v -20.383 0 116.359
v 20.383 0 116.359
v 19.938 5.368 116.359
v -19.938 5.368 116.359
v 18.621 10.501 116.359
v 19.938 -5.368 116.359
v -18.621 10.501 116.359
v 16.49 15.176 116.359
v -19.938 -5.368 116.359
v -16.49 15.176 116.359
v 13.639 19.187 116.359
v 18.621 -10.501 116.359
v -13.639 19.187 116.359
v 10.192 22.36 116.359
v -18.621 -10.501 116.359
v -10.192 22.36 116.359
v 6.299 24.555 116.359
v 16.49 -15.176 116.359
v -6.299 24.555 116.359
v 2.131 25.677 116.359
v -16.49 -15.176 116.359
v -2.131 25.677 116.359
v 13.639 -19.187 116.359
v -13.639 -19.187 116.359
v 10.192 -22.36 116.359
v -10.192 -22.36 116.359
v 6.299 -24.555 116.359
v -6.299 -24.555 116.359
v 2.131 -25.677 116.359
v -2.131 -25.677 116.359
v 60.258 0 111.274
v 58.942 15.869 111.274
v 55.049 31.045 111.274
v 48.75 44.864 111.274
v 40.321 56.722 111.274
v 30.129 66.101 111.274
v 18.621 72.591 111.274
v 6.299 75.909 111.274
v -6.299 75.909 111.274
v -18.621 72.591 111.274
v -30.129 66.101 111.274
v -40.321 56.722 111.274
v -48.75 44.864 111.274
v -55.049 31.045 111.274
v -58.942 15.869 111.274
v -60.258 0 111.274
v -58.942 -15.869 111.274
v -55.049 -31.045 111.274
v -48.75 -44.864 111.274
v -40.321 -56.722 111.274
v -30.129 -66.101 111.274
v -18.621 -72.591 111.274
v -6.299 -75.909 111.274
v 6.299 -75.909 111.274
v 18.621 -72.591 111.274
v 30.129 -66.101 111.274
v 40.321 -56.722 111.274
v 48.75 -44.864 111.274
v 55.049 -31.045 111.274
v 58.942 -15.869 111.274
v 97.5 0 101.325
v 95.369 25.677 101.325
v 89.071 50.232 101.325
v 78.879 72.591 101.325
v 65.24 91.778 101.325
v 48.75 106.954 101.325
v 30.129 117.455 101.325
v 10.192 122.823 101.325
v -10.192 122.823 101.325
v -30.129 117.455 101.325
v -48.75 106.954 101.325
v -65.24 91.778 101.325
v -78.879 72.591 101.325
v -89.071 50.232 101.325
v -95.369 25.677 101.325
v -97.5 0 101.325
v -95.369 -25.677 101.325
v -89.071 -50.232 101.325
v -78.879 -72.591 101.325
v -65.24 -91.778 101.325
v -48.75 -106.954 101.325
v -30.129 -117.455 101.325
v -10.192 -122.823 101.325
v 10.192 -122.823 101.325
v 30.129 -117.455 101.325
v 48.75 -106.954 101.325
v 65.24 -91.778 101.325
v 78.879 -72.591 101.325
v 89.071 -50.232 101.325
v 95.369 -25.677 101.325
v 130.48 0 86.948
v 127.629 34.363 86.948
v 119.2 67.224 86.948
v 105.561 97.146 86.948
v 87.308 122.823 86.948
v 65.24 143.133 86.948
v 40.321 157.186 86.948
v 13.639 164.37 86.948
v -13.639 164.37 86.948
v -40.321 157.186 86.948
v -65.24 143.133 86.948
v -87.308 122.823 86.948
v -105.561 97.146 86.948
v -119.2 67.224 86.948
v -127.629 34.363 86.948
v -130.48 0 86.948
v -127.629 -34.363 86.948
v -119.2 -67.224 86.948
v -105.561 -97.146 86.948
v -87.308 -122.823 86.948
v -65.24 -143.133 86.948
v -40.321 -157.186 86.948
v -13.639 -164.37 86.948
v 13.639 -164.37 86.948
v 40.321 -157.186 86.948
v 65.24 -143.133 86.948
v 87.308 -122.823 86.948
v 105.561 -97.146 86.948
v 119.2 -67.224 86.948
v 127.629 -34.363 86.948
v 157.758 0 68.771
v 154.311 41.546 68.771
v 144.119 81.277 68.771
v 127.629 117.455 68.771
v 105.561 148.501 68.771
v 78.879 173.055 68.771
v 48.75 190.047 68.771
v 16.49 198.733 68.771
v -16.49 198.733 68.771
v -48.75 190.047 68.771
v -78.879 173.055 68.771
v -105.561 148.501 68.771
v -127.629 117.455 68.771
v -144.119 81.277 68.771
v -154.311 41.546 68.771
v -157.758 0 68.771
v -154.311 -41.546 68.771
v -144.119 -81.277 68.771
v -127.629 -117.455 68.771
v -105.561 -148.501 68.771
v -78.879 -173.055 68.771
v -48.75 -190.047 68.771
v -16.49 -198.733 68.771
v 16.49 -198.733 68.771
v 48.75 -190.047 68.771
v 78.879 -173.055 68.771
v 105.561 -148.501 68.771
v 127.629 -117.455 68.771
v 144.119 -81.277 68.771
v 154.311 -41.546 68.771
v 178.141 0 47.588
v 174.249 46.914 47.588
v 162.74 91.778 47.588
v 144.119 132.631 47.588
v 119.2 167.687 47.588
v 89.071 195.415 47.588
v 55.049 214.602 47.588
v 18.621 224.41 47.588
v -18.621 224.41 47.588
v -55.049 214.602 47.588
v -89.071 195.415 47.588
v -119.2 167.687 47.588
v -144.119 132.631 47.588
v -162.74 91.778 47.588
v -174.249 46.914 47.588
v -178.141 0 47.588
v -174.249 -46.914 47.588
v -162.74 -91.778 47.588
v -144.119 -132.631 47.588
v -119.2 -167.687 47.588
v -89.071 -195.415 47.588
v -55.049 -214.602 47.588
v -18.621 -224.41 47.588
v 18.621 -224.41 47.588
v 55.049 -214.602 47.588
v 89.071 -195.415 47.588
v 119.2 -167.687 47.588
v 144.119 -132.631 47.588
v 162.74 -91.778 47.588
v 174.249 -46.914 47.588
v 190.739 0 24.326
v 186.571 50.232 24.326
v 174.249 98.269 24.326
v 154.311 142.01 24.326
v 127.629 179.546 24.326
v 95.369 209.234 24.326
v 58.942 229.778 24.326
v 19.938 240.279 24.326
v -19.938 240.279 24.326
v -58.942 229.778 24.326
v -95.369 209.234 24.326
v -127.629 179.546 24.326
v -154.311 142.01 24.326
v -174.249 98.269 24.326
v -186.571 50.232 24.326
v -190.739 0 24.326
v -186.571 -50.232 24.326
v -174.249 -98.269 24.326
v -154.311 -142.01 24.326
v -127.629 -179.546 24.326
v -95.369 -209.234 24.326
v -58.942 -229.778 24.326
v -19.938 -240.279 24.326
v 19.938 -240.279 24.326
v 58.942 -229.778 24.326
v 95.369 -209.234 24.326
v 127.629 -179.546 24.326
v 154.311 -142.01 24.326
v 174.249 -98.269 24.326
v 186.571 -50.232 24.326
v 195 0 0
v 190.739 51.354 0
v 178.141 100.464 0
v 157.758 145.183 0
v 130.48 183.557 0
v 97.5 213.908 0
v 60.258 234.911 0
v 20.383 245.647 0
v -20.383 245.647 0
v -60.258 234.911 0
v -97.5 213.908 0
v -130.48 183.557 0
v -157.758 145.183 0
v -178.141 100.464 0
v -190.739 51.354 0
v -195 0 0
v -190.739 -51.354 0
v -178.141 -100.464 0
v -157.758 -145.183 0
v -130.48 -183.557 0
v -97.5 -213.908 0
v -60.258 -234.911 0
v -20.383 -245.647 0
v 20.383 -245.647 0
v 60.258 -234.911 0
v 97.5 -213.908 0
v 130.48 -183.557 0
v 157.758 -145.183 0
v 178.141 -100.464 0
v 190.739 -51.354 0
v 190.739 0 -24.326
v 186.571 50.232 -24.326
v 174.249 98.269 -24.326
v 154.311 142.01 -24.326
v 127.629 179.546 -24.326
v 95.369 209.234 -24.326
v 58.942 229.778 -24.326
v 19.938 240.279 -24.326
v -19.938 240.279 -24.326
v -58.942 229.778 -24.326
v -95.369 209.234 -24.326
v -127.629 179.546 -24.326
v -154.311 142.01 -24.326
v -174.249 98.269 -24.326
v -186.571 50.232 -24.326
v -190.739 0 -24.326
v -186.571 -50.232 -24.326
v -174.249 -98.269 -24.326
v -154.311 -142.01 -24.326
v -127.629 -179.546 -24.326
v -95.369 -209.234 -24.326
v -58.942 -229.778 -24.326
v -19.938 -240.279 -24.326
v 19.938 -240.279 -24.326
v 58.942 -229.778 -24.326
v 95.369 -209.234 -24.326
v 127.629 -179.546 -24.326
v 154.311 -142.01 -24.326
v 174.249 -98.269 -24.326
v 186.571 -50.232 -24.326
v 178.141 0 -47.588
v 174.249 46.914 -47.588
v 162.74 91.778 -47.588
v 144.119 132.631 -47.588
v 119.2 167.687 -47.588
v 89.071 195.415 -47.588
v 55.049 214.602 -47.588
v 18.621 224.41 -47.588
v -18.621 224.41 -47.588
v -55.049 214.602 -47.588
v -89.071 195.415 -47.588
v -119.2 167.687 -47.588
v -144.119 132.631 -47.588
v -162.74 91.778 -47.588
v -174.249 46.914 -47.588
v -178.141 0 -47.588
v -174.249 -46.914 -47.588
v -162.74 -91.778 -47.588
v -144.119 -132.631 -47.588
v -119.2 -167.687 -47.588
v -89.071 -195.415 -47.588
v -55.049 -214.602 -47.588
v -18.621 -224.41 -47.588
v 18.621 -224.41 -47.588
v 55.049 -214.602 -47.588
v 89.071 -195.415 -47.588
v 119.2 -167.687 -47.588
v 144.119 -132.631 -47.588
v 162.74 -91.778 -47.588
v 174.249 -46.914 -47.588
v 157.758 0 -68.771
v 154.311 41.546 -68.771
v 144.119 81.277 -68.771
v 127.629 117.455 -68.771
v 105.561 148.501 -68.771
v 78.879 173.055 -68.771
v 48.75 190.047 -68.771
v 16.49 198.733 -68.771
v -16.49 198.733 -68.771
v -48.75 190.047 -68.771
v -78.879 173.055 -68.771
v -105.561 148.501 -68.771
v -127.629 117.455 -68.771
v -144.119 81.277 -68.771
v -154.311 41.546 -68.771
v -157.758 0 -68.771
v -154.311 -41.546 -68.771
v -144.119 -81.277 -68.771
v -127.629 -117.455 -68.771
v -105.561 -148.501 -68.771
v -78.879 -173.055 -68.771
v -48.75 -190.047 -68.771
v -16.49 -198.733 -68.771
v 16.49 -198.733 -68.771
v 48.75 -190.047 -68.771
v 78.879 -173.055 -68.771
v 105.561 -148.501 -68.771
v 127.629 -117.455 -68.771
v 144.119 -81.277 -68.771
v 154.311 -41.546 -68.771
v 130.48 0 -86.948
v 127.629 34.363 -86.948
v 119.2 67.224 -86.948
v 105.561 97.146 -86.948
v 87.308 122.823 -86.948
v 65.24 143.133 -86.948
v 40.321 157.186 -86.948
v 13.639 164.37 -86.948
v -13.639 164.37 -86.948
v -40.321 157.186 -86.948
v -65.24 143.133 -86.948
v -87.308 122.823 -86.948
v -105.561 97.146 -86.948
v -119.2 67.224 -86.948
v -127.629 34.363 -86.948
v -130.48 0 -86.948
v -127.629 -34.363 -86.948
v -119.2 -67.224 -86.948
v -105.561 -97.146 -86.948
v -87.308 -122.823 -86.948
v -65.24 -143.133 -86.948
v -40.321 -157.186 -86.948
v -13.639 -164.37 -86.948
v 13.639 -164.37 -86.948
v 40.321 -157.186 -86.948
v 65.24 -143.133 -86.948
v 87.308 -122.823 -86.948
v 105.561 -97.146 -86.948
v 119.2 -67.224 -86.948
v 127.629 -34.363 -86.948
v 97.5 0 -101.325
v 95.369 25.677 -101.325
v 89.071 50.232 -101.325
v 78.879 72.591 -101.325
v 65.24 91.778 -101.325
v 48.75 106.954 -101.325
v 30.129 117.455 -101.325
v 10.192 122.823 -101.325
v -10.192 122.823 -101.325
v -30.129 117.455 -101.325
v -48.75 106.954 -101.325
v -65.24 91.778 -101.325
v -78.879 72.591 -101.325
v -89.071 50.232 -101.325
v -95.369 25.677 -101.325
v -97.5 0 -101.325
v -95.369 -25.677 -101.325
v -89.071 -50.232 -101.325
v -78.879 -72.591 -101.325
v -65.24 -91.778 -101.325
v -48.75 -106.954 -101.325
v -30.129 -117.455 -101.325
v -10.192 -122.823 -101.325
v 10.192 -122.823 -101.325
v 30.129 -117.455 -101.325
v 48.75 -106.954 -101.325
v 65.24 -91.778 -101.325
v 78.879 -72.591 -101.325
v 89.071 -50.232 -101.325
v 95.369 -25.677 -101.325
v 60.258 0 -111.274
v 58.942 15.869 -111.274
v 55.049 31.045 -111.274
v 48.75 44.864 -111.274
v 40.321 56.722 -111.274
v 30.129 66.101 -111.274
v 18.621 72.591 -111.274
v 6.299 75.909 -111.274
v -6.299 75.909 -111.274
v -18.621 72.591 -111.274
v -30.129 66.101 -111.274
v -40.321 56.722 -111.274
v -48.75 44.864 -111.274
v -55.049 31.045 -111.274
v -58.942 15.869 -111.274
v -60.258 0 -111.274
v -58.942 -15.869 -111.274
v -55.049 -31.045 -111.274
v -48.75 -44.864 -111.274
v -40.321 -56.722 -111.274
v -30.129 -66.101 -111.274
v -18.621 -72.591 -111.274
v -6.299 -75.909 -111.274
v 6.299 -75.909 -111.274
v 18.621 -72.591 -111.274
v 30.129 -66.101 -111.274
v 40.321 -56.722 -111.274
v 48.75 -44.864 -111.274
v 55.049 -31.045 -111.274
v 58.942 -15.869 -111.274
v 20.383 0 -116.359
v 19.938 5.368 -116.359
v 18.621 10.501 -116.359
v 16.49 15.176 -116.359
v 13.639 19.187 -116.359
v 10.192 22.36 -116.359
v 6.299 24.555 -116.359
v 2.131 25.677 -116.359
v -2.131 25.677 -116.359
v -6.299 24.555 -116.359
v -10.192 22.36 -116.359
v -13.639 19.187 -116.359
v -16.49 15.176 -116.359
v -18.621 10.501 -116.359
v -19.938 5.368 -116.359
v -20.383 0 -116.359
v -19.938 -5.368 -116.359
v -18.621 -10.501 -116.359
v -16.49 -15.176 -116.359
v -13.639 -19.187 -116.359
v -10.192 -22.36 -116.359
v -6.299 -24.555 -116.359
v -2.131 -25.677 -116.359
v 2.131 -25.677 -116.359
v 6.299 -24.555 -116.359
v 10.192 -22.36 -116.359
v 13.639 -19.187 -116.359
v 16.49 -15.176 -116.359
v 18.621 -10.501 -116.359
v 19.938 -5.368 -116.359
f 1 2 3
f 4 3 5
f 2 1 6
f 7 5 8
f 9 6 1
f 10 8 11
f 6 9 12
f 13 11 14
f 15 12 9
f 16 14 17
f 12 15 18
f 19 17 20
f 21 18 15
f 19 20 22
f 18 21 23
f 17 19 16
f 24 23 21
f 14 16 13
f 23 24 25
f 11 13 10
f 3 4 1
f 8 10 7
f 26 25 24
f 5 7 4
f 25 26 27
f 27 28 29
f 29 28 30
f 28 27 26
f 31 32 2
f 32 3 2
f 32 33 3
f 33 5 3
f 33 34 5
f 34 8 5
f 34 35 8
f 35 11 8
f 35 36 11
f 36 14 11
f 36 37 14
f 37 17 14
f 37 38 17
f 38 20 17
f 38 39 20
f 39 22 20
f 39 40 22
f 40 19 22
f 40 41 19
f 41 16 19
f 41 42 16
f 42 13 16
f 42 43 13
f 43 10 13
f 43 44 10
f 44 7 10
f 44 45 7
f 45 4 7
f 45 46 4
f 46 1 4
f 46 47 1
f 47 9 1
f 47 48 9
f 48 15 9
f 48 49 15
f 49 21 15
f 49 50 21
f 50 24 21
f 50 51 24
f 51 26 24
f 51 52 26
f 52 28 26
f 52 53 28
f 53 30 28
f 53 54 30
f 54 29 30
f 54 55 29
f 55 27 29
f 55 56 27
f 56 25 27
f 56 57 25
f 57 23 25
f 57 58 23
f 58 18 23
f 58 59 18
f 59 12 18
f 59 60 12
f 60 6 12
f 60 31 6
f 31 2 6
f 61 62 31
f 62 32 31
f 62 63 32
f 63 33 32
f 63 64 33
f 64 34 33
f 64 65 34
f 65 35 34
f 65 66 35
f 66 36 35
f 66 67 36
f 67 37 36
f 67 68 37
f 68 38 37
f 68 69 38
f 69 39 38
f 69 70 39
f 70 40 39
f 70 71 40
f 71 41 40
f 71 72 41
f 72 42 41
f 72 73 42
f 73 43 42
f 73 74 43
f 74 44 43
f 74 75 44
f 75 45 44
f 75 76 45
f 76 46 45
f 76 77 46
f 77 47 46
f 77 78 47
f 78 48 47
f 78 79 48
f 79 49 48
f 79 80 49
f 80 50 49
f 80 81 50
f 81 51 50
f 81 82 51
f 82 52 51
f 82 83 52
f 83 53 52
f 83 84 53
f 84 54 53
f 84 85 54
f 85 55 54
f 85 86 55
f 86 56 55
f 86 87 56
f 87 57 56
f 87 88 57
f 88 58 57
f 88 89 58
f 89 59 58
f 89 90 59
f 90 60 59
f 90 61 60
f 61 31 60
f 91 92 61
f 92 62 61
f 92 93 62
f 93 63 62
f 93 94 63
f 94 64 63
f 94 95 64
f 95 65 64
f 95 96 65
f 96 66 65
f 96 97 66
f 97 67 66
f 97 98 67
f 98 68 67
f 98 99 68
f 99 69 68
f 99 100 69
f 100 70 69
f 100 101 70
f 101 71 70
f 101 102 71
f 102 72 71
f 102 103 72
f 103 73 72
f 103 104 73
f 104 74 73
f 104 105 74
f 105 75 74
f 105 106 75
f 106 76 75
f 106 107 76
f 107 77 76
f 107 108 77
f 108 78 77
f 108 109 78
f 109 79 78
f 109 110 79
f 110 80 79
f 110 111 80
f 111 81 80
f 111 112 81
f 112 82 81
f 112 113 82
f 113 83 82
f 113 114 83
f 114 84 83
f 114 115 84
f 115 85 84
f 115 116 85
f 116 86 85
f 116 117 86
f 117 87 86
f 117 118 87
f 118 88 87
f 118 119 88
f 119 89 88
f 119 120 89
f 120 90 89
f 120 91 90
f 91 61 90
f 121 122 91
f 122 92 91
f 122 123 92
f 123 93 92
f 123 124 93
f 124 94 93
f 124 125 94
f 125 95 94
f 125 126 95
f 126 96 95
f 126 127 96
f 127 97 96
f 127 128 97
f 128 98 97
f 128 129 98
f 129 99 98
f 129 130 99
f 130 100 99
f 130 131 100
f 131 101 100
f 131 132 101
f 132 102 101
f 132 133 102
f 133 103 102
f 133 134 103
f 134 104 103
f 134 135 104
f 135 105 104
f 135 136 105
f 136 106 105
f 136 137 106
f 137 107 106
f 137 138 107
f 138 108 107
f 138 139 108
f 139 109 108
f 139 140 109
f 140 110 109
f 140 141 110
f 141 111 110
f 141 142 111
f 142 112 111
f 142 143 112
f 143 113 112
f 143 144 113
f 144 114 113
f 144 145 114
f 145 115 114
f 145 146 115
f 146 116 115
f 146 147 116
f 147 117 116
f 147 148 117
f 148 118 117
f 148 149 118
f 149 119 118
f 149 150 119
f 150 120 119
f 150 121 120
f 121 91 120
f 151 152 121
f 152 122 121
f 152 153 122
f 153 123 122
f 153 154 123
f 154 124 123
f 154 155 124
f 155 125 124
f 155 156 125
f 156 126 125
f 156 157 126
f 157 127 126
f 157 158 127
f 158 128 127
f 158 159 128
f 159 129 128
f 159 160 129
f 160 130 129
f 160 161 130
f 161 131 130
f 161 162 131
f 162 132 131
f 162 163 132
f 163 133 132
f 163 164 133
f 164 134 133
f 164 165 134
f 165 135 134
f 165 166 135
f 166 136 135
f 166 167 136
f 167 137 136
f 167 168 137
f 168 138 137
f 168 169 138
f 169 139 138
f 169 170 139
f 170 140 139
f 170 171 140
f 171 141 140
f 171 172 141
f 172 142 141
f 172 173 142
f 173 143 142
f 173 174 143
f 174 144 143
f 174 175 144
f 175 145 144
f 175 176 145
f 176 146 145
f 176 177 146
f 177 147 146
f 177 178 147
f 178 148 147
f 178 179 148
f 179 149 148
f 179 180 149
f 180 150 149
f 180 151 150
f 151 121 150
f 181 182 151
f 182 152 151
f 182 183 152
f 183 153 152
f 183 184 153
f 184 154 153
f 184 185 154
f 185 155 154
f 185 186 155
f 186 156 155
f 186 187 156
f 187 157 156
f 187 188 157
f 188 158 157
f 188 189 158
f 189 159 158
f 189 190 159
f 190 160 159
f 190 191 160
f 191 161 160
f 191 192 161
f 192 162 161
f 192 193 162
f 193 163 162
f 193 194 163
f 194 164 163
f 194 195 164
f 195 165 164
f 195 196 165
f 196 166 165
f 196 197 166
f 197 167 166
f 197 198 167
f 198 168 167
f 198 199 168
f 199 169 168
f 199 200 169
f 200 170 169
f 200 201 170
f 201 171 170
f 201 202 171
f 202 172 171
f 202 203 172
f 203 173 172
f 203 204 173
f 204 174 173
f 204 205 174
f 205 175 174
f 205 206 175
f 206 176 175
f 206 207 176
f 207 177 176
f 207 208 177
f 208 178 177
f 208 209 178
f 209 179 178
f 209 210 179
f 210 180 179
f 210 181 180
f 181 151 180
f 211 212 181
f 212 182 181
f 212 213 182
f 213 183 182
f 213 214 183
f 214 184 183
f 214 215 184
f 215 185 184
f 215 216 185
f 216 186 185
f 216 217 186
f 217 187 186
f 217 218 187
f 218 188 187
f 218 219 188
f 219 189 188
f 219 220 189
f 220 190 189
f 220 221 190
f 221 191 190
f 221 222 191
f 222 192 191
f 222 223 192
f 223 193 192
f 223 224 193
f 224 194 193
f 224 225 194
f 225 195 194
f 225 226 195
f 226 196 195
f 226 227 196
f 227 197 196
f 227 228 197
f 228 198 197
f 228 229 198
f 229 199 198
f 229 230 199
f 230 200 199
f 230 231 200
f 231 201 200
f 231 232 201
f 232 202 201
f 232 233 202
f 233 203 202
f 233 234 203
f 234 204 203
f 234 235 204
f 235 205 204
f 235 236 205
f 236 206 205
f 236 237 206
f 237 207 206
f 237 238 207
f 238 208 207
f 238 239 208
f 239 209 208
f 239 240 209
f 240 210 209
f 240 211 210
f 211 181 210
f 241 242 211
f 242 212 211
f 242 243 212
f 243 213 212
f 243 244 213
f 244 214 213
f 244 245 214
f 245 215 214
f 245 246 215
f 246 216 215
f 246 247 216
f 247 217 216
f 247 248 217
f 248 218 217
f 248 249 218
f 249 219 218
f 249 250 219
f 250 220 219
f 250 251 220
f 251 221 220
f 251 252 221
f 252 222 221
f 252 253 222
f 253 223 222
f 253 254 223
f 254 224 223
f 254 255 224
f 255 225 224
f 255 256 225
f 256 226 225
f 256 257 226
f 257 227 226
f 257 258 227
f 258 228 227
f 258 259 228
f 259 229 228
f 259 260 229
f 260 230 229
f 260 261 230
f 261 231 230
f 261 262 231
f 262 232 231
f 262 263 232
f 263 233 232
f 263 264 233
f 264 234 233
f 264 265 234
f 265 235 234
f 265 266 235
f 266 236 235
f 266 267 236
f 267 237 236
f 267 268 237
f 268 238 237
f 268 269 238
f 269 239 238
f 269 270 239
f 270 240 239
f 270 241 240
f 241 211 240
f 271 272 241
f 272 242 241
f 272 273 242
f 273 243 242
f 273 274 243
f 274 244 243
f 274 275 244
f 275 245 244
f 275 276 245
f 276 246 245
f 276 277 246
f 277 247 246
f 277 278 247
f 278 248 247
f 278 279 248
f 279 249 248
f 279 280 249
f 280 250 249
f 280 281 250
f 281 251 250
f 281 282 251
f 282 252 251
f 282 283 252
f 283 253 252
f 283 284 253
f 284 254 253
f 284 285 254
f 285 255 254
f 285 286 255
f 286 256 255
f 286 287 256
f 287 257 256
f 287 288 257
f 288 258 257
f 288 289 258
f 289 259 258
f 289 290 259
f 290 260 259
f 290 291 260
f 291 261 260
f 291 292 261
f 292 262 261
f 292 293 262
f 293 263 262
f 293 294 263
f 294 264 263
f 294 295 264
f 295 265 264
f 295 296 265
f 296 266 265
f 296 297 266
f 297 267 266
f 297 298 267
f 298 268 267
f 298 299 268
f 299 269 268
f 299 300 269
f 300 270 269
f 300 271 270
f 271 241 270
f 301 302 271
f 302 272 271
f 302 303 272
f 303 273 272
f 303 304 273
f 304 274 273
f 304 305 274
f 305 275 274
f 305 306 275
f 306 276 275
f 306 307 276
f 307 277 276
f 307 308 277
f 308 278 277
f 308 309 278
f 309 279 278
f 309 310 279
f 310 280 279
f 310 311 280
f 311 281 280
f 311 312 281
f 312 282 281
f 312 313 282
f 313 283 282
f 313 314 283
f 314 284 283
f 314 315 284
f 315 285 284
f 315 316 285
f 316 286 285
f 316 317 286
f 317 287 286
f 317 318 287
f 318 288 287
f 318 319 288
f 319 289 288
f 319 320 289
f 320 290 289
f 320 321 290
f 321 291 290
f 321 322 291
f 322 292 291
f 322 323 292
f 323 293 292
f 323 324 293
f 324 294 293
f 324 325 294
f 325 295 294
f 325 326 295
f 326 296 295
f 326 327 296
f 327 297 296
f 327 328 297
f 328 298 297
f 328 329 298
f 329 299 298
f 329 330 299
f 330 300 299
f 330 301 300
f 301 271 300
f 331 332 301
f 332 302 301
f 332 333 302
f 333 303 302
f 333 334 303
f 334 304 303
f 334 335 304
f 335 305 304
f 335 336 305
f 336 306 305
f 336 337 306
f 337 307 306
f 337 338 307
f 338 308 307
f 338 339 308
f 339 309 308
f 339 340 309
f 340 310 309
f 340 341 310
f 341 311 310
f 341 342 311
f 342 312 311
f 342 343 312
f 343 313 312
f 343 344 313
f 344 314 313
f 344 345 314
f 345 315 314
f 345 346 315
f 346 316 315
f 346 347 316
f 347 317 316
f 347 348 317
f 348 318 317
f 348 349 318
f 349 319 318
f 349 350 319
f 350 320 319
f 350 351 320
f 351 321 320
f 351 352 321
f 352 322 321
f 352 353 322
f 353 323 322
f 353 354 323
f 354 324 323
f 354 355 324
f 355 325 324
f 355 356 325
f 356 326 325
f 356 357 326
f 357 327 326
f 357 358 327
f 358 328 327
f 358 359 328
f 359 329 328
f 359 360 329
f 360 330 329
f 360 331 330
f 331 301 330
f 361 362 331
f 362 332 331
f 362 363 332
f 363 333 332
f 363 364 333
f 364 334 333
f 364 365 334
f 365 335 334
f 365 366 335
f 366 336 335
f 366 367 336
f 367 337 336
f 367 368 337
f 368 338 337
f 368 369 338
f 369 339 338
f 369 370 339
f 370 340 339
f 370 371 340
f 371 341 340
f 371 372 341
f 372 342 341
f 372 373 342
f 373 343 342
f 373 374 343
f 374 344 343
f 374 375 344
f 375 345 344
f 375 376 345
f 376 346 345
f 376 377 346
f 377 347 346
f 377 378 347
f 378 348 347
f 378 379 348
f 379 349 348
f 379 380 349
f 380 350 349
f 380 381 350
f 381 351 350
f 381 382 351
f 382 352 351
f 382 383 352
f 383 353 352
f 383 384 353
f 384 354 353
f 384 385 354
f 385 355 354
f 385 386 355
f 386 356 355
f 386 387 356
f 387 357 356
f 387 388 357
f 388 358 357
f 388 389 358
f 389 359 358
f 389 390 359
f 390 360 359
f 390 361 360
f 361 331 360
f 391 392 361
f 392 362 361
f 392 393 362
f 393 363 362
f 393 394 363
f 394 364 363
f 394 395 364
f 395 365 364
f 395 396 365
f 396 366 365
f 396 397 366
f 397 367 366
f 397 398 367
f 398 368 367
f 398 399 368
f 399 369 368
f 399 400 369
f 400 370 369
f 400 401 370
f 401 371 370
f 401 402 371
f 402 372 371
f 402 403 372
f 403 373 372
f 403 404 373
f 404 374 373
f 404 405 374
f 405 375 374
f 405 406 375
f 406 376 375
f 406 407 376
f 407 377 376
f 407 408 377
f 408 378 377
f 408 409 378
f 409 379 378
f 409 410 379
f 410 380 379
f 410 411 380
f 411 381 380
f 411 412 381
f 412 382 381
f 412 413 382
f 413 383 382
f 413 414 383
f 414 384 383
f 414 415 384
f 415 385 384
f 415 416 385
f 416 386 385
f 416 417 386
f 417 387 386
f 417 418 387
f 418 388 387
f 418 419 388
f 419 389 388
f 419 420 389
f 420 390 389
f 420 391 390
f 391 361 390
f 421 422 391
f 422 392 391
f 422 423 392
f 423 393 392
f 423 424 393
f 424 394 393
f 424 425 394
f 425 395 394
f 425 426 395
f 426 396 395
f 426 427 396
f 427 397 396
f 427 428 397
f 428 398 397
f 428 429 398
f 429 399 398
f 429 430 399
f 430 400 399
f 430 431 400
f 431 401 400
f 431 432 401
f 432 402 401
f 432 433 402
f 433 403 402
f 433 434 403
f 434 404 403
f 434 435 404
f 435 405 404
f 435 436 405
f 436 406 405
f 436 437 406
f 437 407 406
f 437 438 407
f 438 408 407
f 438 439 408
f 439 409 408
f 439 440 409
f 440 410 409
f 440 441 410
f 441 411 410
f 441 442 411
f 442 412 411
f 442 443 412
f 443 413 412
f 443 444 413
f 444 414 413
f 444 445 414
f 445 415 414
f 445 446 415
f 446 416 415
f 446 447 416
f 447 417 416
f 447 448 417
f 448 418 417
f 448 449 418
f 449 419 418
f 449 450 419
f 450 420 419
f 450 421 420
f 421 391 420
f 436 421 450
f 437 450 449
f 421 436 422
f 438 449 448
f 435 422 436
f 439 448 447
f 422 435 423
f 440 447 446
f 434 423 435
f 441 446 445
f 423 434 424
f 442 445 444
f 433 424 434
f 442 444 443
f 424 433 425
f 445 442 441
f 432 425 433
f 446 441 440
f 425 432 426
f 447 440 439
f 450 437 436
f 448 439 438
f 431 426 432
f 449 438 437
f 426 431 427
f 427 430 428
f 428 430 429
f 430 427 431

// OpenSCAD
// Generated by SolidPython 1.0.1 on 2020-07-29 00:46:52


scale(v = [15, 19, 9]) {
	sphere(r = 13);
}
/***********************************************
*********      SolidPython code:      **********
************************************************
 
# import packages: SolidPython
from solid import *
from solid.utils import *
from itertools import chain, combinations, permutations


class Resize:

    def __init__(self, scad_file):
        self.scad_file = scad_file
        #self.scad_file = import_scad(scad_file)
        # cone/cylinder param:
        self.r1 = 0
        self.r2 = 0
        self.h = 0
        # rectangular prism param:
        self.w = 0
        self.l = 0
        # ellipse param:
        self.r = 0

    # import OpenScad code (file name corresponds to shape)


    # classify shape + parameters
    def assign(self, param1, param2, param3):
        if self.scad_file == 'cone.scad':
            self.r1 = param1
            self.r2 = param2
            self.h = param3
        elif self.scad_file == 'cylinder.scad':
            self.r1 = param1
            self.r2 = param2
            self.h = param3
        elif self.scad_file == 'rectangularPrism.scad':
            self.h = param1
            self.l = param2
            self.w = param3
        else:
            self.r = param1
            self.h = param2

    # resize parameters
    def iterate(self):
        x = range(3, 20, 2)
        i = 1
        if self.scad_file == 'cone.scad':
            tempList = list(permutations(x, 2))
            for temp in tempList:
                param1 = temp[0]
                param2 = temp[1]
                filepath = 'produced_scad_files/' + 'cone' + str(param1) + '_' + str(param2) + '_' + '.scad'
                scad_render_to_file(cylinder(h=param1, r1=param2, r2=0), filepath)

        elif self.scad_file == 'cylinder.scad':
            tempList = list(permutations(x, 3))
            for temp in tempList:
                param1 = temp[0]
                param2 = temp[1]
                filepath = 'produced_scad_files/' + 'cylinder' + str(param1) + '_' + str(param2) + '_' + '.scad'
                scad_render_to_file(cylinder(h=param1, r1=param2, r2=param2), filepath)

        elif self.scad_file == 'rectangularPrism.scad':
            tempList = list(permutations(x, 3))
            for temp in tempList:
                param1 = temp[0]
                param2 = temp[1]
                param3 = temp[2]
                filepath = 'produced_scad_files/' + 'rectangularPrism' + str(param1) + '_' + str(param2) + '_' + str(
                    param3) + '.scad'
                scad_render_to_file(cube(size=(param1, param2, param3)), filepath)

        elif self.scad_file == 'ellipse.scad':
            tempList = list(permutations(x, 4))
            for temp in tempList:
                param1 = temp[0]
                param2 = temp[1]
                param3 = temp[2]
                param4 = temp[3]
                filepath = 'produced_scad_files/' + 'ellipse' + str(param1) + '_' + str(param2) + '_' + str(param3) + '_' + str(param4) + '.scad'
                scad_render_to_file(scale([param1, param2, param3])(sphere(r=param4)), filepath)

    def render_to_scadfile(self):
        scad_render_to_file(scad, 'example.scad') 
 
************************************************/
